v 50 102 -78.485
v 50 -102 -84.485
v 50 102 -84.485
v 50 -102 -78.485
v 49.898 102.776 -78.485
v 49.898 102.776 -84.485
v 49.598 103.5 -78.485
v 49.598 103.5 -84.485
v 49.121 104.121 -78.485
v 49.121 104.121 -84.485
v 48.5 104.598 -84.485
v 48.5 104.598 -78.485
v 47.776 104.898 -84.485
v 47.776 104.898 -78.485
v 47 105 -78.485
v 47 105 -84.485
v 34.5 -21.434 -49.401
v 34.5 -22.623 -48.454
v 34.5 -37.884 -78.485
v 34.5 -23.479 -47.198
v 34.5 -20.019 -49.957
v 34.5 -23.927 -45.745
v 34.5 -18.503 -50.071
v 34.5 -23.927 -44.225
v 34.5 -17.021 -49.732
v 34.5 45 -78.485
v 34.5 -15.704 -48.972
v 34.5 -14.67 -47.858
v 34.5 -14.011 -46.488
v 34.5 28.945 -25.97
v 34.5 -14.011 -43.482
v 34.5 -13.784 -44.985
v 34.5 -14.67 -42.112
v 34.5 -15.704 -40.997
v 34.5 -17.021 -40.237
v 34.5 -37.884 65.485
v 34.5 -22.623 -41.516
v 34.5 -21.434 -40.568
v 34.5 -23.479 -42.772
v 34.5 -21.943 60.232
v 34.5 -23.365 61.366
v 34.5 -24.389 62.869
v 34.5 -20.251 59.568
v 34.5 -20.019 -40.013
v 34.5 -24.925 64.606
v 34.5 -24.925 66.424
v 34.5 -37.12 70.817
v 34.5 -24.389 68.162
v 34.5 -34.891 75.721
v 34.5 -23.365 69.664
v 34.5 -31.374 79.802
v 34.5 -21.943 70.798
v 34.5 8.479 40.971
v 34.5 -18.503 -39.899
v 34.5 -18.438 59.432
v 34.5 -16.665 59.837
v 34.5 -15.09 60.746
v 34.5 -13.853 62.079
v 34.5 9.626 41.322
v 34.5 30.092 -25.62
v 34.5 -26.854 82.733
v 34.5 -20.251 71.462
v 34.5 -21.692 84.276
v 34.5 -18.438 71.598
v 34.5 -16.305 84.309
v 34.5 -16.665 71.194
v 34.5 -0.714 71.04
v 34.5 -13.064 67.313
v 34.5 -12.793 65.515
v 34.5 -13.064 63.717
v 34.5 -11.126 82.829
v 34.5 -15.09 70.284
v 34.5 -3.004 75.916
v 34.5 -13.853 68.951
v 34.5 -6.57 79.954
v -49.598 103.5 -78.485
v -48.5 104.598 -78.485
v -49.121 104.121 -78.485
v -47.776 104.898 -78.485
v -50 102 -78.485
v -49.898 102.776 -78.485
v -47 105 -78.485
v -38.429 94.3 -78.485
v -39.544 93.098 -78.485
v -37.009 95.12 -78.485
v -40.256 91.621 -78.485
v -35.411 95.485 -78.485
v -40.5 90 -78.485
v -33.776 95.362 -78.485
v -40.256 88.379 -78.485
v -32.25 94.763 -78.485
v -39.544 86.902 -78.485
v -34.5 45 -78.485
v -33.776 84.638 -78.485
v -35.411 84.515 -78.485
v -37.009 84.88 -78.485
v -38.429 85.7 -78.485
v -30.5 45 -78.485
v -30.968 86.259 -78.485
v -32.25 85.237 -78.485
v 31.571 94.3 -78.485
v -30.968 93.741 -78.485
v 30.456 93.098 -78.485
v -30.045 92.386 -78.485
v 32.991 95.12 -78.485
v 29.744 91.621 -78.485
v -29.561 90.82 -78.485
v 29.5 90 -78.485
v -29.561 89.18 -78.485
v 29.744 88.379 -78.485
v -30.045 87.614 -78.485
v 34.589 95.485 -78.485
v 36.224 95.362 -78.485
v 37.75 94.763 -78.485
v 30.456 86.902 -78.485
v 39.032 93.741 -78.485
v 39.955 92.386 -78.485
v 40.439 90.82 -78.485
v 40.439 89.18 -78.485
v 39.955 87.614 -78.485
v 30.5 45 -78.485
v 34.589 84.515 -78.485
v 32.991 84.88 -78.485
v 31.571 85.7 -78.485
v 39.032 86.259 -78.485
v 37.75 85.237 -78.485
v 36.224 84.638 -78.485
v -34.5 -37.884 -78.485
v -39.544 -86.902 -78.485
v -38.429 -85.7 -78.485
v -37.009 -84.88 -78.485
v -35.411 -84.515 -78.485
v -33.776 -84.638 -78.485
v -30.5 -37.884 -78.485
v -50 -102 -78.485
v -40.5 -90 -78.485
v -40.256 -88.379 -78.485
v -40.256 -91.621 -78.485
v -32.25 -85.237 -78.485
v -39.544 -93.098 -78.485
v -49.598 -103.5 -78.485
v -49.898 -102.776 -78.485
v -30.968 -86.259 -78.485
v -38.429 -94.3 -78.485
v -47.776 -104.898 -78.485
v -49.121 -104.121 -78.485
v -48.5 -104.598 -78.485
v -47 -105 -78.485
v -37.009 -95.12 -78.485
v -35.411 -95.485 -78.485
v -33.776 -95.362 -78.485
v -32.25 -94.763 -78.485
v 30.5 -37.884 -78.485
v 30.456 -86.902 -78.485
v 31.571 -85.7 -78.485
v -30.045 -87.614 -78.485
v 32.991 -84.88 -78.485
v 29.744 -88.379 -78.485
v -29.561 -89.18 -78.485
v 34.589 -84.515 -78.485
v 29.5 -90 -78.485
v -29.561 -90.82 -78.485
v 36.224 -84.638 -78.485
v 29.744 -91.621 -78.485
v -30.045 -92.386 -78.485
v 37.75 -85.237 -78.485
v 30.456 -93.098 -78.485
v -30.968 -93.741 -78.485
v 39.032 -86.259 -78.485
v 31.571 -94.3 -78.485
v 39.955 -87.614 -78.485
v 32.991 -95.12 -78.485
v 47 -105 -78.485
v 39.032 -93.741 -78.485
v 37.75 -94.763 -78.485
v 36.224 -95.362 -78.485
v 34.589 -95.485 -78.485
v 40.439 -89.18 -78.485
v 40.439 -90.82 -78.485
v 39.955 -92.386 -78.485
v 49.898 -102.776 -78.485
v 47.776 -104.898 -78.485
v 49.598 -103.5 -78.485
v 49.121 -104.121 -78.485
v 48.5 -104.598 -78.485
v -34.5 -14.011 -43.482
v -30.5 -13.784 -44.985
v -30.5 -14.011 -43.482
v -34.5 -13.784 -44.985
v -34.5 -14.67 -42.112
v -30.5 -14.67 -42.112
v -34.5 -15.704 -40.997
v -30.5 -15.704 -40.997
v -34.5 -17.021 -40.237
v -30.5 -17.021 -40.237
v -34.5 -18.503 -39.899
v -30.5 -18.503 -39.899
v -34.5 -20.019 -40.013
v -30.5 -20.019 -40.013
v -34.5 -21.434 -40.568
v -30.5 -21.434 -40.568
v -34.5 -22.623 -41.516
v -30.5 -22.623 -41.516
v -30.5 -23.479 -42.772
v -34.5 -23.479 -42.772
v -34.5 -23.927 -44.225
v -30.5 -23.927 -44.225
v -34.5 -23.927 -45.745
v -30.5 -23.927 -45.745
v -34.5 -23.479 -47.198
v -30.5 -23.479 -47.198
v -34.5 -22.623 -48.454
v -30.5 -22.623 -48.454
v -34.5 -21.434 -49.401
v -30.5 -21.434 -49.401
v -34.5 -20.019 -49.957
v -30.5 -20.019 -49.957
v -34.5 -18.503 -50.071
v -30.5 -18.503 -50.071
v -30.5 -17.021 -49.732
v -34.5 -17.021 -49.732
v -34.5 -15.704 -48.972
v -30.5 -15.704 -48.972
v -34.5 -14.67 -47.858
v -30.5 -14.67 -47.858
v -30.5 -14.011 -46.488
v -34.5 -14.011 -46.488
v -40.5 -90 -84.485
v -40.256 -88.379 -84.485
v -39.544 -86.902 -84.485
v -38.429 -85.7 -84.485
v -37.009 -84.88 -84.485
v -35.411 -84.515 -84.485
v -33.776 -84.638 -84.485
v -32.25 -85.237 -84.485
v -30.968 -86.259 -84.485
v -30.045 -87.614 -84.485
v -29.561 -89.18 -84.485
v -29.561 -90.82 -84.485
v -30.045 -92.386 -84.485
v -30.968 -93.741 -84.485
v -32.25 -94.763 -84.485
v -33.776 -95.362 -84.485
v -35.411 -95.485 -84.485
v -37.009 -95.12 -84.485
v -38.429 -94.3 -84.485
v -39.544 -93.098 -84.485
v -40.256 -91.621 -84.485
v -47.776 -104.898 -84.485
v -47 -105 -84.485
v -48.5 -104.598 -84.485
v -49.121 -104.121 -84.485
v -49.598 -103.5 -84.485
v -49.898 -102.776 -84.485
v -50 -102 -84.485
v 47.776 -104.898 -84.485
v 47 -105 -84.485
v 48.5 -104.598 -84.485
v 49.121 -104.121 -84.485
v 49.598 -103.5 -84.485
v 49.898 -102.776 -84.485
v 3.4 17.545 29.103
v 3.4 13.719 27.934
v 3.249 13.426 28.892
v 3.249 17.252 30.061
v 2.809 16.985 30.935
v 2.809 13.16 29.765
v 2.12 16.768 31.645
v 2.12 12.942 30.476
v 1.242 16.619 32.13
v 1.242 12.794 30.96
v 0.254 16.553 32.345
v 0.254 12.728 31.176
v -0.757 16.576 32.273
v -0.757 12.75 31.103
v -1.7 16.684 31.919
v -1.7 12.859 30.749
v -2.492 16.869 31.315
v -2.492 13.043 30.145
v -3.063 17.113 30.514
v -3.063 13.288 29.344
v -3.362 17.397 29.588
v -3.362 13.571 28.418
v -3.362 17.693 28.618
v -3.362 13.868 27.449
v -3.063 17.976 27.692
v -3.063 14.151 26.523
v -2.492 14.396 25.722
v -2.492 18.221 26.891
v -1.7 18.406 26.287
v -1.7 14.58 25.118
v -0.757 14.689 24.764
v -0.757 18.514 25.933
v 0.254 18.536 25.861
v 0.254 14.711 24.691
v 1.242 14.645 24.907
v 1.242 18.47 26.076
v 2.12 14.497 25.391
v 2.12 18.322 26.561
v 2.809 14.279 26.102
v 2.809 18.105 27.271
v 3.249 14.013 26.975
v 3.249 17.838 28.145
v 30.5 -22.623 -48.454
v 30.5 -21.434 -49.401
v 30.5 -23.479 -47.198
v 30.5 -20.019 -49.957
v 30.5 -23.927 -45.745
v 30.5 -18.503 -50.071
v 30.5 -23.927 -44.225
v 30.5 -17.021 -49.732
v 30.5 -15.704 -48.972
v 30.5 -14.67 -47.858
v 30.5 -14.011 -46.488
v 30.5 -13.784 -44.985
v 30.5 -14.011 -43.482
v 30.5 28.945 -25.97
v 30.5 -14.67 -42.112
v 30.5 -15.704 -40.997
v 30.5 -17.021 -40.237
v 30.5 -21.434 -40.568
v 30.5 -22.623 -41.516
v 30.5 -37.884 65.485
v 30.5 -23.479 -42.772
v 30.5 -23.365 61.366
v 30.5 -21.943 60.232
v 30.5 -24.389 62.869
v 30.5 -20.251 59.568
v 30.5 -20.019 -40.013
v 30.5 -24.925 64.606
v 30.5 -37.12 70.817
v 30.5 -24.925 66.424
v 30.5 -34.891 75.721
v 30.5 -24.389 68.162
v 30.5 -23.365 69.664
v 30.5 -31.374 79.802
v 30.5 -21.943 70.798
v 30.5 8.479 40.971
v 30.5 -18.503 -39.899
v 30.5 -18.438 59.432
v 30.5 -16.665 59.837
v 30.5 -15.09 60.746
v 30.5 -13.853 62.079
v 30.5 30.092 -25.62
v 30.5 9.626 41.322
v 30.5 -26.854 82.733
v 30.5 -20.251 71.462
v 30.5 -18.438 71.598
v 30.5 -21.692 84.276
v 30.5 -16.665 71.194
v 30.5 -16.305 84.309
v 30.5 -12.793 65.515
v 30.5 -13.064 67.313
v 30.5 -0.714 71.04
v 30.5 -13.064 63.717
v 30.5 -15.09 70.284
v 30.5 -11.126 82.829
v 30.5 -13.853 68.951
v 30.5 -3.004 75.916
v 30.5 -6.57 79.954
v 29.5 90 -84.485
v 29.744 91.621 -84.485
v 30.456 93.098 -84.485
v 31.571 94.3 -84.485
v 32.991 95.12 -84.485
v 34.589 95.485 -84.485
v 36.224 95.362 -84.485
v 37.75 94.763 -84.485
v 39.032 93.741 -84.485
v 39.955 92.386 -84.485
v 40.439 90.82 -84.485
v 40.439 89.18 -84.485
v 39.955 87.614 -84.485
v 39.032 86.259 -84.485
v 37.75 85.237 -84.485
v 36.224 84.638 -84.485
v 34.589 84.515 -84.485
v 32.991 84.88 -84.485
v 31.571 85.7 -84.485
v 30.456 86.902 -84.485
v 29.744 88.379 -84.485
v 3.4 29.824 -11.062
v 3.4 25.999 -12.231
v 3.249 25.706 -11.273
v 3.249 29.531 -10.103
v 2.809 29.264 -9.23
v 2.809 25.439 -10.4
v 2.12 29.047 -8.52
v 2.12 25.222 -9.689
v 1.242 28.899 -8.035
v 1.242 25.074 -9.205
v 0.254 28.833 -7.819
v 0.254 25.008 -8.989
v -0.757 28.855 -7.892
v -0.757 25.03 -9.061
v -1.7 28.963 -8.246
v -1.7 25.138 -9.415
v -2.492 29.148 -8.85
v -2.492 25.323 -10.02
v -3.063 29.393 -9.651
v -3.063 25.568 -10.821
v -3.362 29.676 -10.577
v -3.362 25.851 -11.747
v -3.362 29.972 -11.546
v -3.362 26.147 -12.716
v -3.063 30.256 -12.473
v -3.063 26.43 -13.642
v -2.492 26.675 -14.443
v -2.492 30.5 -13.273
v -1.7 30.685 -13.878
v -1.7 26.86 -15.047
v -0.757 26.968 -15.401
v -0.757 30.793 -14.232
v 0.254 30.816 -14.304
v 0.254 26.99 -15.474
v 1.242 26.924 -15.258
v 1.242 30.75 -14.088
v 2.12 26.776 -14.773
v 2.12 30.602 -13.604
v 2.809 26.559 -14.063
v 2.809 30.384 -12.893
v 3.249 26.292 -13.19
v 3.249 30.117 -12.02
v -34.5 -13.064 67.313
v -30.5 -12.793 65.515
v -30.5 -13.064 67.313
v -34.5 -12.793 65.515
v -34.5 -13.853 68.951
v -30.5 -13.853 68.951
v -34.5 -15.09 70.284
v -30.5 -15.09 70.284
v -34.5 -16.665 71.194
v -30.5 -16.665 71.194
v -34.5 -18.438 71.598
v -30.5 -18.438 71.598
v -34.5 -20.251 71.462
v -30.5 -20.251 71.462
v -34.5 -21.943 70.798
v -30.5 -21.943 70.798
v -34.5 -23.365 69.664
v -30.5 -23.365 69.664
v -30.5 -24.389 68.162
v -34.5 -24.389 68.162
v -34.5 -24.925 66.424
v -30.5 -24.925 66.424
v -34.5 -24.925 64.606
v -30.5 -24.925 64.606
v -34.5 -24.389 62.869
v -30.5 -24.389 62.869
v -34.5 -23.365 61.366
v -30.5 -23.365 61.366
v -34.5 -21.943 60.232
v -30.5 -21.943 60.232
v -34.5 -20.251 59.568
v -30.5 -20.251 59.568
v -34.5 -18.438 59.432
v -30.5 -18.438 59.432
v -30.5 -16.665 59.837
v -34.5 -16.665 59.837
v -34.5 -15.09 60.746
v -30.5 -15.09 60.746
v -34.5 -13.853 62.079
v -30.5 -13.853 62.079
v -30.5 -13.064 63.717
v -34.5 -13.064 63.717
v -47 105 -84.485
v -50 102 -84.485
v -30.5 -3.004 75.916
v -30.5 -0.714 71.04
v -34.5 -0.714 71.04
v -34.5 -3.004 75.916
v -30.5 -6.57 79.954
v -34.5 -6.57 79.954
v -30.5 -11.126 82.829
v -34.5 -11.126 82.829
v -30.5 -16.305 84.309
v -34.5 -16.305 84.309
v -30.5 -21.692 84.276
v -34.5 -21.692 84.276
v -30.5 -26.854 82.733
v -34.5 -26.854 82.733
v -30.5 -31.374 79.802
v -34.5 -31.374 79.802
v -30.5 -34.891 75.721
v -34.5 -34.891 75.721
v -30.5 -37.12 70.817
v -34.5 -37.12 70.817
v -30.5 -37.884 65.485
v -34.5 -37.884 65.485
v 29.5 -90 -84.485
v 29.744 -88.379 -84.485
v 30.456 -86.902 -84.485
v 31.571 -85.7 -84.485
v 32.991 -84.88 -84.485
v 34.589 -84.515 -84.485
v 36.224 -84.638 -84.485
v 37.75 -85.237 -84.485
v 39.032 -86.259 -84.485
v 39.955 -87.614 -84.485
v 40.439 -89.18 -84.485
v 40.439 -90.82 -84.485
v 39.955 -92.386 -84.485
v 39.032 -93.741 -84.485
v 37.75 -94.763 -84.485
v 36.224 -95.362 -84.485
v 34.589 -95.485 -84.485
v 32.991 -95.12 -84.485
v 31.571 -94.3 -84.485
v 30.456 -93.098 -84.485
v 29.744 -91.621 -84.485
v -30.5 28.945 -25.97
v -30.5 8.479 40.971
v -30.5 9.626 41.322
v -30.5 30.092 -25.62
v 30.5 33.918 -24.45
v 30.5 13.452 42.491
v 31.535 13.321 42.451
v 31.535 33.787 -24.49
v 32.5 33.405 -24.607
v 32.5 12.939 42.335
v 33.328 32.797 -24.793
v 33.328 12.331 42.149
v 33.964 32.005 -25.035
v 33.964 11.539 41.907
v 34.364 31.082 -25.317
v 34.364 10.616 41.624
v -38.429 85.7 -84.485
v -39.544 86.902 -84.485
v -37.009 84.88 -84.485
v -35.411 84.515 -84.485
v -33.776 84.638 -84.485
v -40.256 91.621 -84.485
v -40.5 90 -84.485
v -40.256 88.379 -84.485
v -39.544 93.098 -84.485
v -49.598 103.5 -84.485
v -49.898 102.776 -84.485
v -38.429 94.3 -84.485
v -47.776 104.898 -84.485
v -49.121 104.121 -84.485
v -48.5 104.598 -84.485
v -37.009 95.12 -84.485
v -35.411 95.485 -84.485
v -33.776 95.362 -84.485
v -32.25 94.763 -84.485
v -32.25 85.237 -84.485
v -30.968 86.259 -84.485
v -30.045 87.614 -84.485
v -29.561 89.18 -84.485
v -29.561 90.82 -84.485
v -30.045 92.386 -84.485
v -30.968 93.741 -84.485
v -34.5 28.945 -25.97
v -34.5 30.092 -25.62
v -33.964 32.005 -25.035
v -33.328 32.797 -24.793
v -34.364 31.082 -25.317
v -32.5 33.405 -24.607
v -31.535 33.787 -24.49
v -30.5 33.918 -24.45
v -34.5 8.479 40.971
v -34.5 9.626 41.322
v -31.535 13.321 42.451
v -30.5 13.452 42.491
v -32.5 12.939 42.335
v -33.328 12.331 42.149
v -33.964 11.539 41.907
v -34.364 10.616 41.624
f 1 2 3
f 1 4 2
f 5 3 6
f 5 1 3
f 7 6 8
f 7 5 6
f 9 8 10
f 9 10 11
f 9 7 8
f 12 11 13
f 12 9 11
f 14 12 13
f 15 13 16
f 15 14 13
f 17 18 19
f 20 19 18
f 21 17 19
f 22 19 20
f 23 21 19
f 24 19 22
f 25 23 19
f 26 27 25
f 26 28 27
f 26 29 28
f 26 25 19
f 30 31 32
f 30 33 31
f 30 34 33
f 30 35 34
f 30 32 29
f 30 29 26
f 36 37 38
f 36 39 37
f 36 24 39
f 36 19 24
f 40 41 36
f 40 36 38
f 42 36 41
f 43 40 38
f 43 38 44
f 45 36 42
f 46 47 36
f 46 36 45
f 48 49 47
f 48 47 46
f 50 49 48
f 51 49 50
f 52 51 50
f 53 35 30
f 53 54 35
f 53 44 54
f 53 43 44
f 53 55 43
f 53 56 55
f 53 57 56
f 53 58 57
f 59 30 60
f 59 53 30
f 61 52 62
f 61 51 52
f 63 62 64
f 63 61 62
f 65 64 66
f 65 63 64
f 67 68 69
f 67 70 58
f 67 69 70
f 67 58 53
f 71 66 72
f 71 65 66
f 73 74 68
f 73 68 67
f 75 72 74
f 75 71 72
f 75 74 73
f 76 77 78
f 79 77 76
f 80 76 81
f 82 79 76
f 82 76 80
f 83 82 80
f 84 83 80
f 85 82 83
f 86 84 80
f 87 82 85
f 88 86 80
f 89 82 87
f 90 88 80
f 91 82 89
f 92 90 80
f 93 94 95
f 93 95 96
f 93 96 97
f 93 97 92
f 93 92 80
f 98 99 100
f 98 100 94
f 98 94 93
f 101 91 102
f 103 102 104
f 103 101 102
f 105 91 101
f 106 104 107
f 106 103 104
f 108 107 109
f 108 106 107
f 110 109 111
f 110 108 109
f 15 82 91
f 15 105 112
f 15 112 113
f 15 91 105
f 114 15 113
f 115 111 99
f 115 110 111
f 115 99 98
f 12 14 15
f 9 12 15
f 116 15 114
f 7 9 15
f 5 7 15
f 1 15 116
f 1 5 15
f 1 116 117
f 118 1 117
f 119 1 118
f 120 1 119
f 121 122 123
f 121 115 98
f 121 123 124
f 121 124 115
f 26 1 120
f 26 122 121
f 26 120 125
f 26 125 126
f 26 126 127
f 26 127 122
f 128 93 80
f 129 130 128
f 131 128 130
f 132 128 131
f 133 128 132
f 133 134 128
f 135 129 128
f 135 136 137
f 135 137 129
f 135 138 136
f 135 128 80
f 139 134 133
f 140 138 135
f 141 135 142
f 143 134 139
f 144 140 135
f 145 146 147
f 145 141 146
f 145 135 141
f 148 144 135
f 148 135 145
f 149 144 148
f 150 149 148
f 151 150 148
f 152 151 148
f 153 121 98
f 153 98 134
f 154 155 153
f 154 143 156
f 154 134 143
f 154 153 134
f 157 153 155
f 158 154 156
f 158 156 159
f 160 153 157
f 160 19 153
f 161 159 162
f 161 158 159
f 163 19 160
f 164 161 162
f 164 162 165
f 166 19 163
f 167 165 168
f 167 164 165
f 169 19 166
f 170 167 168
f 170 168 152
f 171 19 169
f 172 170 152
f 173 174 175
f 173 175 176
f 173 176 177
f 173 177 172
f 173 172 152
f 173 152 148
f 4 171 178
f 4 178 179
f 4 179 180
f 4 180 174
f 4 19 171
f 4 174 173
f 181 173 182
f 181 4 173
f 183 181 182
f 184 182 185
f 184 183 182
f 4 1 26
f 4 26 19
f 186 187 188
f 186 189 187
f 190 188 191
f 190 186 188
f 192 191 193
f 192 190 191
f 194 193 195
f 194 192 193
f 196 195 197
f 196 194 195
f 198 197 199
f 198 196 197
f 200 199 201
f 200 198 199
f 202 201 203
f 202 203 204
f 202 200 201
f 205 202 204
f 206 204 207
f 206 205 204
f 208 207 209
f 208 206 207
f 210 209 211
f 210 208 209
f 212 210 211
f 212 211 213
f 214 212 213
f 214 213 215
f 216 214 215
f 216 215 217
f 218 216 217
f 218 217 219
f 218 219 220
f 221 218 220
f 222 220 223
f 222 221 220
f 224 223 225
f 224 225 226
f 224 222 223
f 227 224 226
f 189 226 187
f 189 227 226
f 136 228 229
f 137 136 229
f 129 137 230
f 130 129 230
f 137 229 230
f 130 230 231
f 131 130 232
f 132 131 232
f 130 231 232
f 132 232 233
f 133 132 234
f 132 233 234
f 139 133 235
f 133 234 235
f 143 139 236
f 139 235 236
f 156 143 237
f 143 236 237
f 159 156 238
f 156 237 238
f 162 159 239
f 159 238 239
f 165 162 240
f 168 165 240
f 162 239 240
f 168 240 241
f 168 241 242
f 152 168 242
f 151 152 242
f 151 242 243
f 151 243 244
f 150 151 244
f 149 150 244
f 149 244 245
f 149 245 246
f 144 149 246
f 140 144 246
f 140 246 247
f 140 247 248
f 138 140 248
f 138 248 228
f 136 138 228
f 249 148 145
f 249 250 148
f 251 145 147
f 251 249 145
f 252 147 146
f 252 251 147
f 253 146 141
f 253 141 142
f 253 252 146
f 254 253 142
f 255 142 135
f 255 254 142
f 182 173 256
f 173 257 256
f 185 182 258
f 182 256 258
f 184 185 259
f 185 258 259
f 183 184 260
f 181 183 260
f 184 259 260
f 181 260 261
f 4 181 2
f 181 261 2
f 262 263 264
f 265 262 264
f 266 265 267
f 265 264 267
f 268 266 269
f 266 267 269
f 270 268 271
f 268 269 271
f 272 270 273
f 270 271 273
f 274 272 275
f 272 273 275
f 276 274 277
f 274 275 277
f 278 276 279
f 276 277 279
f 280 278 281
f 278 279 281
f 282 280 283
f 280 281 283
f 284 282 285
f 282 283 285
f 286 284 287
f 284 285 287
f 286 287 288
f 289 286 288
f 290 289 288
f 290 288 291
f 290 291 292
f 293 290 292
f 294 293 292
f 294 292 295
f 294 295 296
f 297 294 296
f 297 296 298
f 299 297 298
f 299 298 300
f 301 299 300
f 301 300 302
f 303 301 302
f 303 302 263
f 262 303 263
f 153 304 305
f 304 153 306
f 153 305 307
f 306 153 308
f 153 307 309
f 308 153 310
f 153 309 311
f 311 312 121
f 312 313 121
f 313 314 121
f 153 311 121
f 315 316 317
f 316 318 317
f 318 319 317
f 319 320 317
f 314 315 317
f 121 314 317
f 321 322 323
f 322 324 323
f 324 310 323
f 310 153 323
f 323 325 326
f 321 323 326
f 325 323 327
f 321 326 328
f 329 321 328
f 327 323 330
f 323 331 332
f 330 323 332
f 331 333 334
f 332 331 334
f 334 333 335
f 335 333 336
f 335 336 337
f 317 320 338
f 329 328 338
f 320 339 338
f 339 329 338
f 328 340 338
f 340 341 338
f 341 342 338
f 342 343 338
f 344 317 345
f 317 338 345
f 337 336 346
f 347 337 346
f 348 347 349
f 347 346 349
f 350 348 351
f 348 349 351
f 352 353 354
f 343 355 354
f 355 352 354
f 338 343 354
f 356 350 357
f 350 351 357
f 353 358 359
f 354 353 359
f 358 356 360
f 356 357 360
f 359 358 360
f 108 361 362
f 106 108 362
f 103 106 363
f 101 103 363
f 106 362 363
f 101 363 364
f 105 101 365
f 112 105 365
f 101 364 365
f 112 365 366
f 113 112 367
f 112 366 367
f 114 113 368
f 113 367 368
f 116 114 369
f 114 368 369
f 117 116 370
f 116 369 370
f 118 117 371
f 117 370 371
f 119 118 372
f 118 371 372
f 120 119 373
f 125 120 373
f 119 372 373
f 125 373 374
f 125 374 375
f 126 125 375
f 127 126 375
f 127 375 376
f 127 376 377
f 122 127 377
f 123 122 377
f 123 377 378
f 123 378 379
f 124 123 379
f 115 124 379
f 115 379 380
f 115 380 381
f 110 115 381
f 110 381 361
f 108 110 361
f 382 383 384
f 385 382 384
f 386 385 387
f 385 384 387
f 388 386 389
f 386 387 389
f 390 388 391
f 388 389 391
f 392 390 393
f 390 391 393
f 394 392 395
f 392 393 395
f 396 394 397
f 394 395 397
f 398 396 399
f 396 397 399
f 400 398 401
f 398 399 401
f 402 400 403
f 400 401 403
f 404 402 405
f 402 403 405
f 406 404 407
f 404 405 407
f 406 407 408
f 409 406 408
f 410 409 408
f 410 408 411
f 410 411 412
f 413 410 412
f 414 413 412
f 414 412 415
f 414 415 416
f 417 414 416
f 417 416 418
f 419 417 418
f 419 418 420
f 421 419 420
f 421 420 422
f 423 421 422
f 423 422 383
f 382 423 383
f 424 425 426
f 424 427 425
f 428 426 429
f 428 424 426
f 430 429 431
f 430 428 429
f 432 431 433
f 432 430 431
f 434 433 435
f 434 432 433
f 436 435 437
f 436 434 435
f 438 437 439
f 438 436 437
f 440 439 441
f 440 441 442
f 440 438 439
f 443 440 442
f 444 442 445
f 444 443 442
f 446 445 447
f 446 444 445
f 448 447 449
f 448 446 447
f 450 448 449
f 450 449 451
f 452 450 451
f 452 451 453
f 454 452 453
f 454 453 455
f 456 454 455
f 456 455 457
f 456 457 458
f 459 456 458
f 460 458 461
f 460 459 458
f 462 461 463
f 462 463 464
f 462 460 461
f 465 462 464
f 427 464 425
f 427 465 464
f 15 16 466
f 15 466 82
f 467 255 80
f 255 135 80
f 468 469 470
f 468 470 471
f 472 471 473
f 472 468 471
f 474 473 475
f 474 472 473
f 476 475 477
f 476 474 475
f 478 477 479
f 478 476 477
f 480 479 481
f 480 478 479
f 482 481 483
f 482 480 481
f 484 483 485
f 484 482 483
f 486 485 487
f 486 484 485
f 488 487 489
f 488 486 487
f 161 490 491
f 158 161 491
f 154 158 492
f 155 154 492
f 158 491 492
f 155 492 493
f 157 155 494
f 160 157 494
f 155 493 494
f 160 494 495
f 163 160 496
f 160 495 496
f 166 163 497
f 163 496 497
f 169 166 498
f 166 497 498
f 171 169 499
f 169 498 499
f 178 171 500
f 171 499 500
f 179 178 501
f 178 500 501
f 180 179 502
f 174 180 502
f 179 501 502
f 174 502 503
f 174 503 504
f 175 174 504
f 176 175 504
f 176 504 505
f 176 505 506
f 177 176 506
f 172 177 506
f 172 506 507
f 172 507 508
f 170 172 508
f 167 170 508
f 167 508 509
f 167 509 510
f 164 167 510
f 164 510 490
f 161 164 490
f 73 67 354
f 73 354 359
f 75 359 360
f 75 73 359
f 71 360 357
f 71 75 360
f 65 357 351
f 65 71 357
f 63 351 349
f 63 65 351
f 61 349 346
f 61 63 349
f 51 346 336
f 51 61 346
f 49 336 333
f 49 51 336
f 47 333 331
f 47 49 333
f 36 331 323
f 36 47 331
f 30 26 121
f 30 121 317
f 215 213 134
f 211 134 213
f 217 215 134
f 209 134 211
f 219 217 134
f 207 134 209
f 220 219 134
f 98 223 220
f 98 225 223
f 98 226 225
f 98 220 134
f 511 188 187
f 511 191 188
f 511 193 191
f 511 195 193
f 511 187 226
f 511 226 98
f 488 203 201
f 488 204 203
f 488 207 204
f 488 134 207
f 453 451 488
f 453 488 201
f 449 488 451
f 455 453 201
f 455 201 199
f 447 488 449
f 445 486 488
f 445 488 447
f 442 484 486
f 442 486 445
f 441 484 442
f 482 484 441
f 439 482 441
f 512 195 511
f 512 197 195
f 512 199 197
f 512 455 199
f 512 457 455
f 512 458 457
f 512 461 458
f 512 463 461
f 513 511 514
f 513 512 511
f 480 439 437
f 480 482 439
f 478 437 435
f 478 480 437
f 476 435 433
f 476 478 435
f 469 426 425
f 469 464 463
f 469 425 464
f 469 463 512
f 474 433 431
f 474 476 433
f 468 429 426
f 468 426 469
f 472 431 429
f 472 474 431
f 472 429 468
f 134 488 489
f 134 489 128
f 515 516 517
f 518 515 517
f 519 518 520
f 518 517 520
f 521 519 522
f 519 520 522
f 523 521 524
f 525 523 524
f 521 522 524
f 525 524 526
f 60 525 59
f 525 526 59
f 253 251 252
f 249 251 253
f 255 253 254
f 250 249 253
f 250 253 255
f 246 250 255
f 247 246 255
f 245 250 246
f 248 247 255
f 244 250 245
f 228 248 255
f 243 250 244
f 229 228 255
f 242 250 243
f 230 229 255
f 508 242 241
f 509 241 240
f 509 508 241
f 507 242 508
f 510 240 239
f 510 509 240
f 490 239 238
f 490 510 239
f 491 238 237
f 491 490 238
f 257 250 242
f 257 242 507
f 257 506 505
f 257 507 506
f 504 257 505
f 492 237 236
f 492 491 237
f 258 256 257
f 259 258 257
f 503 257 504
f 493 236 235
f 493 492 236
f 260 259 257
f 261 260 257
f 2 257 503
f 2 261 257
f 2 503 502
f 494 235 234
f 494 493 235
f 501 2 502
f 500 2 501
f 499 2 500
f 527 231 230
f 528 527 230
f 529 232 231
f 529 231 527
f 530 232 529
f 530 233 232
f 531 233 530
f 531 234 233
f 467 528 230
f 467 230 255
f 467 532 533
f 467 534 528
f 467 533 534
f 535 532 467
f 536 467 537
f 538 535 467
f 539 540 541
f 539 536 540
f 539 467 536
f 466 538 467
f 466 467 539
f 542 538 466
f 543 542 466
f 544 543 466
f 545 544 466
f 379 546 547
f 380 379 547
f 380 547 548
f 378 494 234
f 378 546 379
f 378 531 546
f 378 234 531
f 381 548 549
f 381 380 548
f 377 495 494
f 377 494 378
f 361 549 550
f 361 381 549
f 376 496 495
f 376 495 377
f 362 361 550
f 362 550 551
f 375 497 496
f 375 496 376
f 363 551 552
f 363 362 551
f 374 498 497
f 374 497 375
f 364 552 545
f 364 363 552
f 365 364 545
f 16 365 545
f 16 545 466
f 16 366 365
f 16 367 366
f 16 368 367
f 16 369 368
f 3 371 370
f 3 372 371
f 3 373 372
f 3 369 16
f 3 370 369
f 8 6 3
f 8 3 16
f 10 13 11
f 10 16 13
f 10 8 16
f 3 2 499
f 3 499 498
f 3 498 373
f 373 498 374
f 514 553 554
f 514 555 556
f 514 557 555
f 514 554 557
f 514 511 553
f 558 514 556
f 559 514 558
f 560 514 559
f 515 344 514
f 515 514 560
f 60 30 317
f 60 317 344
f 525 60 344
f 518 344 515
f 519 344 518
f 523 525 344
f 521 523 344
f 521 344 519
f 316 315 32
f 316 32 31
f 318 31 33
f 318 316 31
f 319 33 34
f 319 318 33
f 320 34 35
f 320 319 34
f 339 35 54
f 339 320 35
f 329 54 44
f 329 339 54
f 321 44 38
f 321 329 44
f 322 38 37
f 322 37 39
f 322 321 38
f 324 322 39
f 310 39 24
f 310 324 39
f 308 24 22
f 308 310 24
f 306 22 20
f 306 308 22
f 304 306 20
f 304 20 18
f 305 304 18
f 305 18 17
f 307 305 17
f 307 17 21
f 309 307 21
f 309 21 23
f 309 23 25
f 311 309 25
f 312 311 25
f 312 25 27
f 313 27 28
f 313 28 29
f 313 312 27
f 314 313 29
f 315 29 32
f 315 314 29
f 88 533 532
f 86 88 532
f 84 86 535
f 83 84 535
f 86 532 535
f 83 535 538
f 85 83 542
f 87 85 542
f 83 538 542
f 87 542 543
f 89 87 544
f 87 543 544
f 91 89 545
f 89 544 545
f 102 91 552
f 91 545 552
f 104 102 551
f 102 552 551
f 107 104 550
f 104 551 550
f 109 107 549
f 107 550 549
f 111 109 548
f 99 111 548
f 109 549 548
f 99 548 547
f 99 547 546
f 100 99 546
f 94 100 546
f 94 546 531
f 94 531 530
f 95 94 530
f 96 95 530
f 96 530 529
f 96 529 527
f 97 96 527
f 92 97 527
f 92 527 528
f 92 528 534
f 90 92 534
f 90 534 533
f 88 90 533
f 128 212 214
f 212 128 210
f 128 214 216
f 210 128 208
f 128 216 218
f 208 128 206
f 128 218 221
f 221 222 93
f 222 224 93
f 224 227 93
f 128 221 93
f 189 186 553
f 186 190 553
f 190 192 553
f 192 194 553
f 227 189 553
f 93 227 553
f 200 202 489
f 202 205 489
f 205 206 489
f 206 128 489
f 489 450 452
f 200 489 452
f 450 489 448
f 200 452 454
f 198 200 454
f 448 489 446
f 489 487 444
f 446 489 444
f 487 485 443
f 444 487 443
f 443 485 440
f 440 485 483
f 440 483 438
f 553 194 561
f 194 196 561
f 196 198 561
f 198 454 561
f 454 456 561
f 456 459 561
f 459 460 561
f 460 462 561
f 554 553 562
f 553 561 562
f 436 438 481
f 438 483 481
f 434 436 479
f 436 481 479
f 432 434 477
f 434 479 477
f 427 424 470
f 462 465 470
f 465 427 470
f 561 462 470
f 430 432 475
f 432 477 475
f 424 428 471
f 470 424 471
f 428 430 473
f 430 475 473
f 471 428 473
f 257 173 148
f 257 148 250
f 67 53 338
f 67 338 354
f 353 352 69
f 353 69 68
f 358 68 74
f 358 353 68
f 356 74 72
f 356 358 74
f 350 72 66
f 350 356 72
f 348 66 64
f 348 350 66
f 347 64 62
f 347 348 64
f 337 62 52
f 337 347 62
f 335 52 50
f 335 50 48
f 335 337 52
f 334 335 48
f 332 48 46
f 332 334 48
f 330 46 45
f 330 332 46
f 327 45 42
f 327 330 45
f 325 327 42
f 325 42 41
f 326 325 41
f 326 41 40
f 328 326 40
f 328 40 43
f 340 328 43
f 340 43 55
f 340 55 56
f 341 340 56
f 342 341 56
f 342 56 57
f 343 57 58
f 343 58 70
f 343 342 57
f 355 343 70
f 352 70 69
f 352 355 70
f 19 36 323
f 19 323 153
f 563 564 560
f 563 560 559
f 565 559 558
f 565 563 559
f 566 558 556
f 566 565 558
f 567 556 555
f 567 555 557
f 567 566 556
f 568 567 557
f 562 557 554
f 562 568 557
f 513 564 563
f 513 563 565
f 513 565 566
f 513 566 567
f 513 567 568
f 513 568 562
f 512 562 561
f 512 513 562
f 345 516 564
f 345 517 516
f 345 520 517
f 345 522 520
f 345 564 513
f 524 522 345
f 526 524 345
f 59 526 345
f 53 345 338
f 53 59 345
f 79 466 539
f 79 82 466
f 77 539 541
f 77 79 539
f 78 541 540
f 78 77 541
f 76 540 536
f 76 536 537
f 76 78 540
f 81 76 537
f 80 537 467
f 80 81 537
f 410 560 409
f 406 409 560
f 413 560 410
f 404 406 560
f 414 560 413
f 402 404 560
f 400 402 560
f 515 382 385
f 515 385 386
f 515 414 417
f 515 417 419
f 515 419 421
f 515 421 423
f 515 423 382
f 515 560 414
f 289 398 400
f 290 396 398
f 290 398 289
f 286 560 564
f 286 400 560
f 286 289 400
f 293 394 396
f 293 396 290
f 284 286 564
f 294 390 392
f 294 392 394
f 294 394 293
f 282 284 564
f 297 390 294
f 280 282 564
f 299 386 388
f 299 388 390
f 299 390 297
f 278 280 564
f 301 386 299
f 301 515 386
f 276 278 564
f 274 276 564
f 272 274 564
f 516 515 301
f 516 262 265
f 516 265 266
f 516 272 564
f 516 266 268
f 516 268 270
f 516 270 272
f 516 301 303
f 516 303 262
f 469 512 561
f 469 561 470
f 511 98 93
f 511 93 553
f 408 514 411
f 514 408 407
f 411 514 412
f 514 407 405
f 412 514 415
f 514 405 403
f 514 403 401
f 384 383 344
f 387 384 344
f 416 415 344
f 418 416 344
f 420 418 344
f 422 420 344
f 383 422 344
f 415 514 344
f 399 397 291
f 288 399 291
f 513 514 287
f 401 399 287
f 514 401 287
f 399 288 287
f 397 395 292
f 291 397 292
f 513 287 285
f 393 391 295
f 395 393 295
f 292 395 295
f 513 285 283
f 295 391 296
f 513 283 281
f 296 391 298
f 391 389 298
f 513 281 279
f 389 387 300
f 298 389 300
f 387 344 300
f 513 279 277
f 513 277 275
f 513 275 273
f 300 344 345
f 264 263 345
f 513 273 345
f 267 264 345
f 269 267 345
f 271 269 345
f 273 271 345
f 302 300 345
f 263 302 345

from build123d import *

# Parameters (mm, degrees)
F0_R          = 5.1
F0_R_2        = 6.1
F1_DEPTH      = 34.5
F2_R          = 4
F3_T          = 4
F4_DEPTH      = 50
F4_DEPTH_BACK = 50
F5_R          = 3
F7_D          = 11
F9_D          = 6.8


# Not quite as in the source:
# - ends of sketch curves that miss each other by under 0.0002 mm in the source are joined
# - a shell that OpenCascade refuses in one call is made with other operations: the cavity is built on its own and cut out
# - a feature names something its author has since deleted; it is built from what else it names


with BuildPart() as f1:
    # F0 (on Right) → F1 (new body, symmetric)
    with BuildSketch(Plane.YZ):
        with BuildLine():
            Line((1.885386, -78.484767), (45, -78.484767))
            Line((45, -78.484767), (28.944748, -25.970405))
            Line((28.944748, -25.970405), (33.917533, -24.450072))
            Line((33.917533, -24.450072), (13.451514, 42.49126))
            Line((13.451514, 42.49126), (8.478729, 40.970928))
            Line((8.478729, 40.970928), (-0.714257, 71.03983))
            ThreePointArc((-0.714257, 71.03983), (-21.6924256797, 84.2760694236), (-37.884047, 65.484768))
            Line((-37.884047, 65.484768), (-37.884047, -78.484767))
            Line((-37.884047, -78.484767), (-3.771468, -78.484767))
            Line((-3.771468, -78.484767), (1.885386, -78.484767))
        make_face()
        with Locations((-18.884047, -44.984767)):
            Circle(F0_R, mode=Mode.SUBTRACT)
        with Locations((-18.893362, 65.515233)):
            Circle(F0_R_2, mode=Mode.SUBTRACT)
    extrude(amount=F1_DEPTH, both=True)

    # F2
    f2_edges = [f1.edges().sort_by_distance(p)[0] for p in [
        (-34.5, 23.684523, 9.020594),
        (34.5, 23.684523, 9.020594),
    ]]
    fillet(f2_edges, radius=F2_R)

    # F3: shell of thickness 4, made by hand


with BuildPart() as f3_core1:
    # F3_t2: copy of F1
    add(f1.part)

    # the walls: a layer under each face that stays
    f3_faces = [f3_core1.faces().sort_by_distance(p)[0] for p in [
        (-34.5, 3.5579765, 3.0000004813),
        (0, 23.6845235, 9.020594),
        (34.5, 3.5579765, 3.0000004813),
    ]]
    thicken(f3_faces, amount=-F3_T, mode=Mode.SUBTRACT)


with BuildPart() as f1_1:
    add(f1.part)

    # what is left inside the walls is the cavity
    f3_cavity = [f3_core1.part.solids().sort_by_distance(p)[0] for p in [
        (-30.46, 3.557976, -24.161589),
    ]]
    add(f3_cavity, mode=Mode.SUBTRACT)

    # F0 (on Right) → F4 (join, two sides)
    with BuildSketch(Plane.YZ) as f4_sk:
        Polygon((-105, -84.484767), (105, -84.484767), (105, -78.484767), (45, -78.484767), (1.885386, -78.484767), (-3.771468, -78.484767), (-37.884047, -78.484767), (-105, -78.484767), align=None)
    extrude(amount=F4_DEPTH)
    extrude(f4_sk.sketch, amount=-F4_DEPTH_BACK)

    # F5
    f5_edges = [f1_1.edges().sort_by_distance(p)[0] for p in [
        (-50, -105, -81.484767),
        (50, -105, -81.484767),
        (50, 105, -81.484767),
        (-50, 105, -81.484767),
    ]]
    fillet(f5_edges, radius=F5_R)

    # F7 (through all)
    with Locations(Plane.XY.offset(-78.484767)):
        with Locations((-35, 90), (-35, -90), (35, -90), (35, 90)):
            Hole(F7_D / 2)

    # F9 (through all)
    with Locations(Plane(origin=(0, 24.1820677637, 7.3932000384), x_dir=(-1, 0, 0), z_dir=(0, 0.9563047562, 0.2923717041))):
        with Locations((0, 22.7017519629), (0, -19.2982480371)):
            Hole(F9_D / 2)


solid = f1_1.part
